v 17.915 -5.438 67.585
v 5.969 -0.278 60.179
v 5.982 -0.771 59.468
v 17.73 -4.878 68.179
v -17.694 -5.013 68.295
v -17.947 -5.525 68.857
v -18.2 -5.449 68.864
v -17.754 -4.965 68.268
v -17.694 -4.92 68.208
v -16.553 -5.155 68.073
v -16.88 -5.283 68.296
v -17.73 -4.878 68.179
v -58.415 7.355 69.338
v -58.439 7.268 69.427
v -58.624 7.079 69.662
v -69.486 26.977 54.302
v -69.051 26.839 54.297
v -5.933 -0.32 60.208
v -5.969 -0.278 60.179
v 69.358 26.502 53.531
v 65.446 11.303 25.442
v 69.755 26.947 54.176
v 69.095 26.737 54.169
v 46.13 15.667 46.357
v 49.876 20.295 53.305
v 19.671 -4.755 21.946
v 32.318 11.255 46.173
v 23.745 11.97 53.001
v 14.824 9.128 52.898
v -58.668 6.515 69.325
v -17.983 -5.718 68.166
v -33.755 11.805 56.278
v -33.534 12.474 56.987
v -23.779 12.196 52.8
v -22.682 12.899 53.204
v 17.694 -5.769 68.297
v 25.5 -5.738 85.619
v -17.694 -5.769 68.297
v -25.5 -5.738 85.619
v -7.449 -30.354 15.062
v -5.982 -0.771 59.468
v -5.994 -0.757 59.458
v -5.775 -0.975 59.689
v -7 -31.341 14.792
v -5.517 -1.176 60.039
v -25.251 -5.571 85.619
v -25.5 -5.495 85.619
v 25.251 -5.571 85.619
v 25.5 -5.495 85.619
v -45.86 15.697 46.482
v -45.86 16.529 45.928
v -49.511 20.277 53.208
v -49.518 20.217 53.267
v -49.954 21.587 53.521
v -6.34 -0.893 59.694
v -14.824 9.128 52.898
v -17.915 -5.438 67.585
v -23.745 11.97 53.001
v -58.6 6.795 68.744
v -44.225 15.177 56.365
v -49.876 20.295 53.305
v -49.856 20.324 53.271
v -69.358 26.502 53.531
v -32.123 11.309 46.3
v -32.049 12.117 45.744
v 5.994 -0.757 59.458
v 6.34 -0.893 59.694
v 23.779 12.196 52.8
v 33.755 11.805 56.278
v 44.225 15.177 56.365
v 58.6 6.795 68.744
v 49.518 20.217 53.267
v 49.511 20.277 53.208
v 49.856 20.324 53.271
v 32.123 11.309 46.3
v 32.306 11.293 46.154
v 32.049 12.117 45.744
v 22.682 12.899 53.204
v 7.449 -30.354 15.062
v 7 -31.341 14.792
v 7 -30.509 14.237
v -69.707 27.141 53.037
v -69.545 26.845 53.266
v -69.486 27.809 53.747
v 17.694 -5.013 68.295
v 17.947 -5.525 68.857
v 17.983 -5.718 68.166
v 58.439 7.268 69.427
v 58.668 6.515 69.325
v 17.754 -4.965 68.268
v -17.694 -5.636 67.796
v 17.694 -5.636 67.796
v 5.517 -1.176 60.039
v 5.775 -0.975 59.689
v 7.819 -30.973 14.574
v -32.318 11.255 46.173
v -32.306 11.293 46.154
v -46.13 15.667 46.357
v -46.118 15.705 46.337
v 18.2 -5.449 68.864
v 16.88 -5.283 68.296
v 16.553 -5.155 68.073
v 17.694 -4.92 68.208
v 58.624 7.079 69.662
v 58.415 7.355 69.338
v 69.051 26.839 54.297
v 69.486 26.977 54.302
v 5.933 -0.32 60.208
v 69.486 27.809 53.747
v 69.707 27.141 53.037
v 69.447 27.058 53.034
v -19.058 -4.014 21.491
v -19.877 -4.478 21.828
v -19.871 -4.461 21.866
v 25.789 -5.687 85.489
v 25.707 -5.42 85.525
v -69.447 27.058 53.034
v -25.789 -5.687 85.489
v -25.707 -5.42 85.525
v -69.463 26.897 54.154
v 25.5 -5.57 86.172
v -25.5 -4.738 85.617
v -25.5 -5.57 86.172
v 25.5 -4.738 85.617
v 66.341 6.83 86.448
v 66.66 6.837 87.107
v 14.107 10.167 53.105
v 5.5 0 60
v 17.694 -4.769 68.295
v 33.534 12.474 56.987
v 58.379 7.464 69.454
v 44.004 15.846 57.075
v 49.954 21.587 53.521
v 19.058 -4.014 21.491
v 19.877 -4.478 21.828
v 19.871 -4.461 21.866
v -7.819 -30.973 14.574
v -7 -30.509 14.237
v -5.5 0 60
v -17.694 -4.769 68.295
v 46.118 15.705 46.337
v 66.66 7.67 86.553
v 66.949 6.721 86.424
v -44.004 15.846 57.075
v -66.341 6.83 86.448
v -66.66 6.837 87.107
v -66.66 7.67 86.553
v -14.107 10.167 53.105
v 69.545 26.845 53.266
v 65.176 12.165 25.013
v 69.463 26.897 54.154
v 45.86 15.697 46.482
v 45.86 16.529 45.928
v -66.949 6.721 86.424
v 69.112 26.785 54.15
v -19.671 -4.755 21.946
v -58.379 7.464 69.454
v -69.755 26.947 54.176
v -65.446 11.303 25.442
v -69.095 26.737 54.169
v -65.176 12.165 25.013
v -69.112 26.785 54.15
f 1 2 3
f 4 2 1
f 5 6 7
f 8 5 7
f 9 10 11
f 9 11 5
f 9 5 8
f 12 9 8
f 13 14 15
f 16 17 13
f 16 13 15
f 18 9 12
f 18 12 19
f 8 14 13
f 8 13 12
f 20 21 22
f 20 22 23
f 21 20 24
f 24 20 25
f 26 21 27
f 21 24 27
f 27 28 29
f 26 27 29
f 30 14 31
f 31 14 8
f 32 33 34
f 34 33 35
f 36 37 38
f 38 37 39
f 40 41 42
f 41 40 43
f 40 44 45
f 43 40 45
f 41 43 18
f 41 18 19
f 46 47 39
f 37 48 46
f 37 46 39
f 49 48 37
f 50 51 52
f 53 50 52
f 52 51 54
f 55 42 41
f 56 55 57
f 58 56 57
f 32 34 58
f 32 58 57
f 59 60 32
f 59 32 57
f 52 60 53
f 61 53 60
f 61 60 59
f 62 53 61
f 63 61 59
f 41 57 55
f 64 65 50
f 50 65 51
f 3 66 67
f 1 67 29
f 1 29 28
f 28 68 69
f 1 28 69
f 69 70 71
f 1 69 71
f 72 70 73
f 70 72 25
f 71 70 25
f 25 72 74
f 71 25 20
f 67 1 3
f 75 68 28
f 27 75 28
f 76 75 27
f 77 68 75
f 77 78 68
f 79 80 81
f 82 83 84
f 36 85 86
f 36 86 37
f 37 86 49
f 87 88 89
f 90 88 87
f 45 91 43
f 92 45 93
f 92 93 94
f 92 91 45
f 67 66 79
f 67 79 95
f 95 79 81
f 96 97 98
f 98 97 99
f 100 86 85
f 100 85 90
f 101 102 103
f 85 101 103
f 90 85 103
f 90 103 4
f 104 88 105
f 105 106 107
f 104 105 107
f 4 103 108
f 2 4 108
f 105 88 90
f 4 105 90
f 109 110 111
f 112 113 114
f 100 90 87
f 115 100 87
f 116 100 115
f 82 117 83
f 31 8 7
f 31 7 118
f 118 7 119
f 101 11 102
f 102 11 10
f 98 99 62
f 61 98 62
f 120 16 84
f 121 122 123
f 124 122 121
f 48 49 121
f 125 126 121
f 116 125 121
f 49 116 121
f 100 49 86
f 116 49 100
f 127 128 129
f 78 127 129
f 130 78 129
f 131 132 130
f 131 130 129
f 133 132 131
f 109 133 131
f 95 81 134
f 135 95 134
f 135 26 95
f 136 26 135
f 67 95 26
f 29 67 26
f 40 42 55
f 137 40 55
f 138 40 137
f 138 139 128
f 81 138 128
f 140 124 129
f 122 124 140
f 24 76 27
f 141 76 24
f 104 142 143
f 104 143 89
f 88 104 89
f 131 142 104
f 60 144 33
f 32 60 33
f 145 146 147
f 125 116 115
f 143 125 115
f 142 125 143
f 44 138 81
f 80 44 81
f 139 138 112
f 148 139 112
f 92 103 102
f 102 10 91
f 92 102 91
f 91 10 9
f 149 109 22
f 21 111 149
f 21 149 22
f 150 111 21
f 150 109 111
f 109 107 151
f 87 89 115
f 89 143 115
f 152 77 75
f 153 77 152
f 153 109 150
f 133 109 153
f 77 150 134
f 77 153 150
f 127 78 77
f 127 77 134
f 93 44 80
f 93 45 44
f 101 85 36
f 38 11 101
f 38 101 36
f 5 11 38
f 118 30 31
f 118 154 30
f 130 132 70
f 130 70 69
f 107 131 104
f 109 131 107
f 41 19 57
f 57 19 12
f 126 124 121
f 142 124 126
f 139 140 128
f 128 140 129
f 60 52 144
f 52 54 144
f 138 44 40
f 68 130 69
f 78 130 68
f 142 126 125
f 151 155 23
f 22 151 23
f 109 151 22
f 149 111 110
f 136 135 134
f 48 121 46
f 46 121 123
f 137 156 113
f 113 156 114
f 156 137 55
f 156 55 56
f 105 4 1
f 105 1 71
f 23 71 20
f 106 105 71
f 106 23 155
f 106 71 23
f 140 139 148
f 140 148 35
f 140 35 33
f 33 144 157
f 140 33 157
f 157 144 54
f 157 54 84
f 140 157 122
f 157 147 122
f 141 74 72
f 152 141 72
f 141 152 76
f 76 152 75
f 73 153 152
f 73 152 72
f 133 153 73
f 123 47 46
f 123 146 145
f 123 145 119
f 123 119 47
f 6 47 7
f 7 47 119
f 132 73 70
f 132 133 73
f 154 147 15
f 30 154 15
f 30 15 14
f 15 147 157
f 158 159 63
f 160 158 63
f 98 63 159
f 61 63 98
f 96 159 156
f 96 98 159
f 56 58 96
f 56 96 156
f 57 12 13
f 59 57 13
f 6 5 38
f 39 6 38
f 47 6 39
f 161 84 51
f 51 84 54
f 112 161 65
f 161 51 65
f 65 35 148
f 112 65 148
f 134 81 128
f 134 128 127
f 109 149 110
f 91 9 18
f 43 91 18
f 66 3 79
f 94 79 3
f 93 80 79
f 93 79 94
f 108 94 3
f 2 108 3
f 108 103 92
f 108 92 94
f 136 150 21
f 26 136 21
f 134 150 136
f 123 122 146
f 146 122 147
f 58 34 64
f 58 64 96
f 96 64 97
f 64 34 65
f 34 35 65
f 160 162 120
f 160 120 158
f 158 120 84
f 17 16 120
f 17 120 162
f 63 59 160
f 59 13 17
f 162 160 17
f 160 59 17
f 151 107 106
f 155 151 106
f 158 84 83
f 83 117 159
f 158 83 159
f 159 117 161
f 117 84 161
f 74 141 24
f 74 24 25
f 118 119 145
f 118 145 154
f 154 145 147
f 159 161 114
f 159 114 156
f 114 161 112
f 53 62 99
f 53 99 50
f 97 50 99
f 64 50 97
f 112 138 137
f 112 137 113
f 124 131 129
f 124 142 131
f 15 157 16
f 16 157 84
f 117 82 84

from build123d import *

# Parameters (mm, degrees)
F17_DEPTH = 1
F18_DEPTH = 1
F19_DEPTH = 1
F20_DEPTH = 1
F21_DEPTH = 1
F22_DEPTH = 1
F23_DEPTH = 1
F24_DEPTH = 1


with BuildPart() as f17:
    # F4 (on face) → F17 (new body)
    with BuildSketch(Plane(origin=(0, -27.6923076923, 18.4615384615), x_dir=(-1, 0, 0), z_dir=(0, 0.8320502943, -0.5547001962))):
        Polygon((0, -5.0769823397), (0, 49.9230176603), (-5.5, 49.9230176603), (-7, -5.0769823397), align=None)
    extrude(amount=-F17_DEPTH)



with BuildPart() as f18:
    # F6 (on face) → F18 (new body)
    with BuildSketch(Plane(origin=(20.2323563967, -11.4858345379, 8.3203939199), x_dir=(0.4299219493, 0.8853858987, 0.1768019455), z_dir=(0.8188475708, -0.4648567634, 0.3367444808))):
        Polygon((12.9726874522, 53.3990429211), (-21.4851809627, 10.5049255587), (8.4396185165, 12.6277482381), (24.455774925, 43.748203471), align=None)
    extrude(amount=F18_DEPTH)


with BuildPart() as f19:
    # F8 (on face) → F19 (new body)
    with BuildSketch(Plane(origin=(4.8053501819, -15.3618907739, 7.6432203914), x_dir=(-0.9629489756, -0.2414490977, 0.1201316097), z_dir=(-0.2696836488, 0.8621329558, -0.4289492931))):
        Polygon((-14.8009827937, 17.4534178176), (-9.6599579922, 52.0737855798), (-18.5647011331, 53.379752499), (-28.2916584396, 46.352213701), (-42.6343822268, 48.4820668331), (-46.8858296731, 57.5333205922), (-67.1688557163, 60.5080230193), (-62.6933705008, 27.8129158611), align=None)
    extrude(amount=-F19_DEPTH)


with BuildPart() as f20:
    # F10 (on 3pt) → F20 (new body)
    with BuildSketch(Plane(origin=(-9.1548198434, 27.6665002624, 29.3655492724), x_dir=(0.9752092929, 0.1517429862, 0.161061793), z_dir=(-0.2212845115, 0.6687371352, 0.7098054726))):
        Polygon((32.6463562181, -27.0957188494), (23.8535633809, -29.0158214828), (15.0273586911, -41.144222481), (27.5314988539, -50.3037245848), (69.2506974563, -42.194565074), (80.6394600631, -16.615353079), (60.611431934, -20.9889201884), (54.5101233323, -27.6051149669), (43.7738027725, -29.9991535705), align=None)
    extrude(amount=-F20_DEPTH)


with BuildPart() as f21:
    # F12 (on 3pt) → F21 (new body)
    with BuildSketch(Plane(origin=(0, 25.9269177768, 14.9071230511), x_dir=(-1, 0, 0), z_dir=(0, 0.866918652, 0.4984496473))):
        Polygon((-5.5, 52.0151191187), (0, 52.0151191187), (0, 61.5834322338), (-17.6941536866, 61.5834322338), align=None)
    extrude(amount=-F21_DEPTH)


with BuildPart() as f22:
    # F14 (on face) → F22 (new body)
    with BuildSketch(Plane(origin=(0, -4.8915048648, 0.0087522318), x_dir=(1, 0, 0), z_dir=(0, -0.9999983993, 0.001789269))):
        Polygon((0, 85.6087991728), (0, 68.2863061845), (17.6941536866, 68.2863061845), (25.5, 85.6087991728), align=None)
    extrude(amount=F22_DEPTH)


with BuildPart() as f23:
    # F16 (on 3pt) → F23 (new body)
    with BuildSketch(Plane(origin=(0.2488682272, -0.8172223653, -0.1106827247), x_dir=(-0.9573575318, -0.2862919438, -0.0387747249), z_dir=(-0.2889057916, 0.9486959304, 0.1284892032))):
        Polygon((-60.7194634198, 67.8234958605), (-18.2223306139, 68.3171589865), (-26.3758637032, 85.4787410279), (-69.3695216955, 84.7402476712), align=None)
    extrude(amount=-F23_DEPTH)


with BuildPart() as f17_1:
    add(f17.part)

    add(f18.part)  # F24 merges F18

    add(f19.part)  # F24 merges F19

    add(f20.part)  # F24 merges F20

    add(f21.part)  # F24 merges F21

    add(f22.part)  # F24 merges F22

    add(f23.part)  # F24 merges F23
    # F4 (on face) + F6 (on face) + F8 (on face) + F10 (on 3pt) + F12 (on 3pt) + F14 (on face) + F16 (on 3pt) → F24 (join)
    with BuildSketch(Plane(origin=(0, -27.6923076923, 18.4615384615), x_dir=(-1, 0, 0), z_dir=(0, 0.8320502943, -0.5547001962))):
        Polygon((0, -5.0769823397), (0, 49.9230176603), (-5.5, 49.9230176603), (-7, -5.0769823397), align=None)
    with BuildSketch(Plane(origin=(20.2323563967, -11.4858345379, 8.3203939199), x_dir=(0.4299219493, 0.8853858987, 0.1768019455), z_dir=(0.8188475708, -0.4648567634, 0.3367444808))):
        Polygon((12.9726874522, 53.3990429211), (-21.4851809627, 10.5049255587), (8.4396185165, 12.6277482381), (24.455774925, 43.748203471), align=None)
    with BuildSketch(Plane(origin=(4.8053501819, -15.3618907739, 7.6432203914), x_dir=(-0.9629489756, -0.2414490977, 0.1201316097), z_dir=(-0.2696836488, 0.8621329558, -0.4289492931))):
        Polygon((-14.8009827937, 17.4534178176), (-9.6599579922, 52.0737855798), (-18.5647011331, 53.379752499), (-28.2916584396, 46.352213701), (-42.6343822268, 48.4820668331), (-46.8858296731, 57.5333205922), (-67.1688557163, 60.5080230193), (-62.6933705008, 27.8129158611), align=None)
    with BuildSketch(Plane(origin=(-9.1548198434, 27.6665002624, 29.3655492724), x_dir=(0.9752092929, 0.1517429862, 0.161061793), z_dir=(-0.2212845115, 0.6687371352, 0.7098054726))):
        Polygon((32.6463562181, -27.0957188494), (23.8535633809, -29.0158214828), (15.0273586911, -41.144222481), (27.5314988539, -50.3037245848), (69.2506974563, -42.194565074), (80.6394600631, -16.615353079), (60.611431934, -20.9889201884), (54.5101233323, -27.6051149669), (43.7738027725, -29.9991535705), align=None)
    with BuildSketch(Plane(origin=(0, 25.9269177768, 14.9071230511), x_dir=(-1, 0, 0), z_dir=(0, 0.866918652, 0.4984496473))):
        Polygon((-5.5, 52.0151191187), (0, 52.0151191187), (0, 61.5834322338), (-17.6941536866, 61.5834322338), align=None)
    with BuildSketch(Plane(origin=(0, -4.8915048648, 0.0087522318), x_dir=(1, 0, 0), z_dir=(0, -0.9999983993, 0.001789269))):
        Polygon((0, 85.6087991728), (0, 68.2863061845), (17.6941536866, 68.2863061845), (25.5, 85.6087991728), align=None)
    with BuildSketch(Plane(origin=(0.2488682272, -0.8172223653, -0.1106827247), x_dir=(-0.9573575318, -0.2862919438, -0.0387747249), z_dir=(-0.2889057916, 0.9486959304, 0.1284892032))):
        Polygon((-60.7194634198, 67.8234958605), (-18.2223306139, 68.3171589865), (-26.3758637032, 85.4787410279), (-69.3695216955, 84.7402476712), align=None)
    extrude(amount=-F24_DEPTH, dir=(0, 0.8320502943, -0.5547001962))

    # F25: F17 across plane


with BuildPart() as f17_2:
    add(f17_1.part)
    add(f17_1.part.mirror(Plane.YZ))


solid = f17_2.part
